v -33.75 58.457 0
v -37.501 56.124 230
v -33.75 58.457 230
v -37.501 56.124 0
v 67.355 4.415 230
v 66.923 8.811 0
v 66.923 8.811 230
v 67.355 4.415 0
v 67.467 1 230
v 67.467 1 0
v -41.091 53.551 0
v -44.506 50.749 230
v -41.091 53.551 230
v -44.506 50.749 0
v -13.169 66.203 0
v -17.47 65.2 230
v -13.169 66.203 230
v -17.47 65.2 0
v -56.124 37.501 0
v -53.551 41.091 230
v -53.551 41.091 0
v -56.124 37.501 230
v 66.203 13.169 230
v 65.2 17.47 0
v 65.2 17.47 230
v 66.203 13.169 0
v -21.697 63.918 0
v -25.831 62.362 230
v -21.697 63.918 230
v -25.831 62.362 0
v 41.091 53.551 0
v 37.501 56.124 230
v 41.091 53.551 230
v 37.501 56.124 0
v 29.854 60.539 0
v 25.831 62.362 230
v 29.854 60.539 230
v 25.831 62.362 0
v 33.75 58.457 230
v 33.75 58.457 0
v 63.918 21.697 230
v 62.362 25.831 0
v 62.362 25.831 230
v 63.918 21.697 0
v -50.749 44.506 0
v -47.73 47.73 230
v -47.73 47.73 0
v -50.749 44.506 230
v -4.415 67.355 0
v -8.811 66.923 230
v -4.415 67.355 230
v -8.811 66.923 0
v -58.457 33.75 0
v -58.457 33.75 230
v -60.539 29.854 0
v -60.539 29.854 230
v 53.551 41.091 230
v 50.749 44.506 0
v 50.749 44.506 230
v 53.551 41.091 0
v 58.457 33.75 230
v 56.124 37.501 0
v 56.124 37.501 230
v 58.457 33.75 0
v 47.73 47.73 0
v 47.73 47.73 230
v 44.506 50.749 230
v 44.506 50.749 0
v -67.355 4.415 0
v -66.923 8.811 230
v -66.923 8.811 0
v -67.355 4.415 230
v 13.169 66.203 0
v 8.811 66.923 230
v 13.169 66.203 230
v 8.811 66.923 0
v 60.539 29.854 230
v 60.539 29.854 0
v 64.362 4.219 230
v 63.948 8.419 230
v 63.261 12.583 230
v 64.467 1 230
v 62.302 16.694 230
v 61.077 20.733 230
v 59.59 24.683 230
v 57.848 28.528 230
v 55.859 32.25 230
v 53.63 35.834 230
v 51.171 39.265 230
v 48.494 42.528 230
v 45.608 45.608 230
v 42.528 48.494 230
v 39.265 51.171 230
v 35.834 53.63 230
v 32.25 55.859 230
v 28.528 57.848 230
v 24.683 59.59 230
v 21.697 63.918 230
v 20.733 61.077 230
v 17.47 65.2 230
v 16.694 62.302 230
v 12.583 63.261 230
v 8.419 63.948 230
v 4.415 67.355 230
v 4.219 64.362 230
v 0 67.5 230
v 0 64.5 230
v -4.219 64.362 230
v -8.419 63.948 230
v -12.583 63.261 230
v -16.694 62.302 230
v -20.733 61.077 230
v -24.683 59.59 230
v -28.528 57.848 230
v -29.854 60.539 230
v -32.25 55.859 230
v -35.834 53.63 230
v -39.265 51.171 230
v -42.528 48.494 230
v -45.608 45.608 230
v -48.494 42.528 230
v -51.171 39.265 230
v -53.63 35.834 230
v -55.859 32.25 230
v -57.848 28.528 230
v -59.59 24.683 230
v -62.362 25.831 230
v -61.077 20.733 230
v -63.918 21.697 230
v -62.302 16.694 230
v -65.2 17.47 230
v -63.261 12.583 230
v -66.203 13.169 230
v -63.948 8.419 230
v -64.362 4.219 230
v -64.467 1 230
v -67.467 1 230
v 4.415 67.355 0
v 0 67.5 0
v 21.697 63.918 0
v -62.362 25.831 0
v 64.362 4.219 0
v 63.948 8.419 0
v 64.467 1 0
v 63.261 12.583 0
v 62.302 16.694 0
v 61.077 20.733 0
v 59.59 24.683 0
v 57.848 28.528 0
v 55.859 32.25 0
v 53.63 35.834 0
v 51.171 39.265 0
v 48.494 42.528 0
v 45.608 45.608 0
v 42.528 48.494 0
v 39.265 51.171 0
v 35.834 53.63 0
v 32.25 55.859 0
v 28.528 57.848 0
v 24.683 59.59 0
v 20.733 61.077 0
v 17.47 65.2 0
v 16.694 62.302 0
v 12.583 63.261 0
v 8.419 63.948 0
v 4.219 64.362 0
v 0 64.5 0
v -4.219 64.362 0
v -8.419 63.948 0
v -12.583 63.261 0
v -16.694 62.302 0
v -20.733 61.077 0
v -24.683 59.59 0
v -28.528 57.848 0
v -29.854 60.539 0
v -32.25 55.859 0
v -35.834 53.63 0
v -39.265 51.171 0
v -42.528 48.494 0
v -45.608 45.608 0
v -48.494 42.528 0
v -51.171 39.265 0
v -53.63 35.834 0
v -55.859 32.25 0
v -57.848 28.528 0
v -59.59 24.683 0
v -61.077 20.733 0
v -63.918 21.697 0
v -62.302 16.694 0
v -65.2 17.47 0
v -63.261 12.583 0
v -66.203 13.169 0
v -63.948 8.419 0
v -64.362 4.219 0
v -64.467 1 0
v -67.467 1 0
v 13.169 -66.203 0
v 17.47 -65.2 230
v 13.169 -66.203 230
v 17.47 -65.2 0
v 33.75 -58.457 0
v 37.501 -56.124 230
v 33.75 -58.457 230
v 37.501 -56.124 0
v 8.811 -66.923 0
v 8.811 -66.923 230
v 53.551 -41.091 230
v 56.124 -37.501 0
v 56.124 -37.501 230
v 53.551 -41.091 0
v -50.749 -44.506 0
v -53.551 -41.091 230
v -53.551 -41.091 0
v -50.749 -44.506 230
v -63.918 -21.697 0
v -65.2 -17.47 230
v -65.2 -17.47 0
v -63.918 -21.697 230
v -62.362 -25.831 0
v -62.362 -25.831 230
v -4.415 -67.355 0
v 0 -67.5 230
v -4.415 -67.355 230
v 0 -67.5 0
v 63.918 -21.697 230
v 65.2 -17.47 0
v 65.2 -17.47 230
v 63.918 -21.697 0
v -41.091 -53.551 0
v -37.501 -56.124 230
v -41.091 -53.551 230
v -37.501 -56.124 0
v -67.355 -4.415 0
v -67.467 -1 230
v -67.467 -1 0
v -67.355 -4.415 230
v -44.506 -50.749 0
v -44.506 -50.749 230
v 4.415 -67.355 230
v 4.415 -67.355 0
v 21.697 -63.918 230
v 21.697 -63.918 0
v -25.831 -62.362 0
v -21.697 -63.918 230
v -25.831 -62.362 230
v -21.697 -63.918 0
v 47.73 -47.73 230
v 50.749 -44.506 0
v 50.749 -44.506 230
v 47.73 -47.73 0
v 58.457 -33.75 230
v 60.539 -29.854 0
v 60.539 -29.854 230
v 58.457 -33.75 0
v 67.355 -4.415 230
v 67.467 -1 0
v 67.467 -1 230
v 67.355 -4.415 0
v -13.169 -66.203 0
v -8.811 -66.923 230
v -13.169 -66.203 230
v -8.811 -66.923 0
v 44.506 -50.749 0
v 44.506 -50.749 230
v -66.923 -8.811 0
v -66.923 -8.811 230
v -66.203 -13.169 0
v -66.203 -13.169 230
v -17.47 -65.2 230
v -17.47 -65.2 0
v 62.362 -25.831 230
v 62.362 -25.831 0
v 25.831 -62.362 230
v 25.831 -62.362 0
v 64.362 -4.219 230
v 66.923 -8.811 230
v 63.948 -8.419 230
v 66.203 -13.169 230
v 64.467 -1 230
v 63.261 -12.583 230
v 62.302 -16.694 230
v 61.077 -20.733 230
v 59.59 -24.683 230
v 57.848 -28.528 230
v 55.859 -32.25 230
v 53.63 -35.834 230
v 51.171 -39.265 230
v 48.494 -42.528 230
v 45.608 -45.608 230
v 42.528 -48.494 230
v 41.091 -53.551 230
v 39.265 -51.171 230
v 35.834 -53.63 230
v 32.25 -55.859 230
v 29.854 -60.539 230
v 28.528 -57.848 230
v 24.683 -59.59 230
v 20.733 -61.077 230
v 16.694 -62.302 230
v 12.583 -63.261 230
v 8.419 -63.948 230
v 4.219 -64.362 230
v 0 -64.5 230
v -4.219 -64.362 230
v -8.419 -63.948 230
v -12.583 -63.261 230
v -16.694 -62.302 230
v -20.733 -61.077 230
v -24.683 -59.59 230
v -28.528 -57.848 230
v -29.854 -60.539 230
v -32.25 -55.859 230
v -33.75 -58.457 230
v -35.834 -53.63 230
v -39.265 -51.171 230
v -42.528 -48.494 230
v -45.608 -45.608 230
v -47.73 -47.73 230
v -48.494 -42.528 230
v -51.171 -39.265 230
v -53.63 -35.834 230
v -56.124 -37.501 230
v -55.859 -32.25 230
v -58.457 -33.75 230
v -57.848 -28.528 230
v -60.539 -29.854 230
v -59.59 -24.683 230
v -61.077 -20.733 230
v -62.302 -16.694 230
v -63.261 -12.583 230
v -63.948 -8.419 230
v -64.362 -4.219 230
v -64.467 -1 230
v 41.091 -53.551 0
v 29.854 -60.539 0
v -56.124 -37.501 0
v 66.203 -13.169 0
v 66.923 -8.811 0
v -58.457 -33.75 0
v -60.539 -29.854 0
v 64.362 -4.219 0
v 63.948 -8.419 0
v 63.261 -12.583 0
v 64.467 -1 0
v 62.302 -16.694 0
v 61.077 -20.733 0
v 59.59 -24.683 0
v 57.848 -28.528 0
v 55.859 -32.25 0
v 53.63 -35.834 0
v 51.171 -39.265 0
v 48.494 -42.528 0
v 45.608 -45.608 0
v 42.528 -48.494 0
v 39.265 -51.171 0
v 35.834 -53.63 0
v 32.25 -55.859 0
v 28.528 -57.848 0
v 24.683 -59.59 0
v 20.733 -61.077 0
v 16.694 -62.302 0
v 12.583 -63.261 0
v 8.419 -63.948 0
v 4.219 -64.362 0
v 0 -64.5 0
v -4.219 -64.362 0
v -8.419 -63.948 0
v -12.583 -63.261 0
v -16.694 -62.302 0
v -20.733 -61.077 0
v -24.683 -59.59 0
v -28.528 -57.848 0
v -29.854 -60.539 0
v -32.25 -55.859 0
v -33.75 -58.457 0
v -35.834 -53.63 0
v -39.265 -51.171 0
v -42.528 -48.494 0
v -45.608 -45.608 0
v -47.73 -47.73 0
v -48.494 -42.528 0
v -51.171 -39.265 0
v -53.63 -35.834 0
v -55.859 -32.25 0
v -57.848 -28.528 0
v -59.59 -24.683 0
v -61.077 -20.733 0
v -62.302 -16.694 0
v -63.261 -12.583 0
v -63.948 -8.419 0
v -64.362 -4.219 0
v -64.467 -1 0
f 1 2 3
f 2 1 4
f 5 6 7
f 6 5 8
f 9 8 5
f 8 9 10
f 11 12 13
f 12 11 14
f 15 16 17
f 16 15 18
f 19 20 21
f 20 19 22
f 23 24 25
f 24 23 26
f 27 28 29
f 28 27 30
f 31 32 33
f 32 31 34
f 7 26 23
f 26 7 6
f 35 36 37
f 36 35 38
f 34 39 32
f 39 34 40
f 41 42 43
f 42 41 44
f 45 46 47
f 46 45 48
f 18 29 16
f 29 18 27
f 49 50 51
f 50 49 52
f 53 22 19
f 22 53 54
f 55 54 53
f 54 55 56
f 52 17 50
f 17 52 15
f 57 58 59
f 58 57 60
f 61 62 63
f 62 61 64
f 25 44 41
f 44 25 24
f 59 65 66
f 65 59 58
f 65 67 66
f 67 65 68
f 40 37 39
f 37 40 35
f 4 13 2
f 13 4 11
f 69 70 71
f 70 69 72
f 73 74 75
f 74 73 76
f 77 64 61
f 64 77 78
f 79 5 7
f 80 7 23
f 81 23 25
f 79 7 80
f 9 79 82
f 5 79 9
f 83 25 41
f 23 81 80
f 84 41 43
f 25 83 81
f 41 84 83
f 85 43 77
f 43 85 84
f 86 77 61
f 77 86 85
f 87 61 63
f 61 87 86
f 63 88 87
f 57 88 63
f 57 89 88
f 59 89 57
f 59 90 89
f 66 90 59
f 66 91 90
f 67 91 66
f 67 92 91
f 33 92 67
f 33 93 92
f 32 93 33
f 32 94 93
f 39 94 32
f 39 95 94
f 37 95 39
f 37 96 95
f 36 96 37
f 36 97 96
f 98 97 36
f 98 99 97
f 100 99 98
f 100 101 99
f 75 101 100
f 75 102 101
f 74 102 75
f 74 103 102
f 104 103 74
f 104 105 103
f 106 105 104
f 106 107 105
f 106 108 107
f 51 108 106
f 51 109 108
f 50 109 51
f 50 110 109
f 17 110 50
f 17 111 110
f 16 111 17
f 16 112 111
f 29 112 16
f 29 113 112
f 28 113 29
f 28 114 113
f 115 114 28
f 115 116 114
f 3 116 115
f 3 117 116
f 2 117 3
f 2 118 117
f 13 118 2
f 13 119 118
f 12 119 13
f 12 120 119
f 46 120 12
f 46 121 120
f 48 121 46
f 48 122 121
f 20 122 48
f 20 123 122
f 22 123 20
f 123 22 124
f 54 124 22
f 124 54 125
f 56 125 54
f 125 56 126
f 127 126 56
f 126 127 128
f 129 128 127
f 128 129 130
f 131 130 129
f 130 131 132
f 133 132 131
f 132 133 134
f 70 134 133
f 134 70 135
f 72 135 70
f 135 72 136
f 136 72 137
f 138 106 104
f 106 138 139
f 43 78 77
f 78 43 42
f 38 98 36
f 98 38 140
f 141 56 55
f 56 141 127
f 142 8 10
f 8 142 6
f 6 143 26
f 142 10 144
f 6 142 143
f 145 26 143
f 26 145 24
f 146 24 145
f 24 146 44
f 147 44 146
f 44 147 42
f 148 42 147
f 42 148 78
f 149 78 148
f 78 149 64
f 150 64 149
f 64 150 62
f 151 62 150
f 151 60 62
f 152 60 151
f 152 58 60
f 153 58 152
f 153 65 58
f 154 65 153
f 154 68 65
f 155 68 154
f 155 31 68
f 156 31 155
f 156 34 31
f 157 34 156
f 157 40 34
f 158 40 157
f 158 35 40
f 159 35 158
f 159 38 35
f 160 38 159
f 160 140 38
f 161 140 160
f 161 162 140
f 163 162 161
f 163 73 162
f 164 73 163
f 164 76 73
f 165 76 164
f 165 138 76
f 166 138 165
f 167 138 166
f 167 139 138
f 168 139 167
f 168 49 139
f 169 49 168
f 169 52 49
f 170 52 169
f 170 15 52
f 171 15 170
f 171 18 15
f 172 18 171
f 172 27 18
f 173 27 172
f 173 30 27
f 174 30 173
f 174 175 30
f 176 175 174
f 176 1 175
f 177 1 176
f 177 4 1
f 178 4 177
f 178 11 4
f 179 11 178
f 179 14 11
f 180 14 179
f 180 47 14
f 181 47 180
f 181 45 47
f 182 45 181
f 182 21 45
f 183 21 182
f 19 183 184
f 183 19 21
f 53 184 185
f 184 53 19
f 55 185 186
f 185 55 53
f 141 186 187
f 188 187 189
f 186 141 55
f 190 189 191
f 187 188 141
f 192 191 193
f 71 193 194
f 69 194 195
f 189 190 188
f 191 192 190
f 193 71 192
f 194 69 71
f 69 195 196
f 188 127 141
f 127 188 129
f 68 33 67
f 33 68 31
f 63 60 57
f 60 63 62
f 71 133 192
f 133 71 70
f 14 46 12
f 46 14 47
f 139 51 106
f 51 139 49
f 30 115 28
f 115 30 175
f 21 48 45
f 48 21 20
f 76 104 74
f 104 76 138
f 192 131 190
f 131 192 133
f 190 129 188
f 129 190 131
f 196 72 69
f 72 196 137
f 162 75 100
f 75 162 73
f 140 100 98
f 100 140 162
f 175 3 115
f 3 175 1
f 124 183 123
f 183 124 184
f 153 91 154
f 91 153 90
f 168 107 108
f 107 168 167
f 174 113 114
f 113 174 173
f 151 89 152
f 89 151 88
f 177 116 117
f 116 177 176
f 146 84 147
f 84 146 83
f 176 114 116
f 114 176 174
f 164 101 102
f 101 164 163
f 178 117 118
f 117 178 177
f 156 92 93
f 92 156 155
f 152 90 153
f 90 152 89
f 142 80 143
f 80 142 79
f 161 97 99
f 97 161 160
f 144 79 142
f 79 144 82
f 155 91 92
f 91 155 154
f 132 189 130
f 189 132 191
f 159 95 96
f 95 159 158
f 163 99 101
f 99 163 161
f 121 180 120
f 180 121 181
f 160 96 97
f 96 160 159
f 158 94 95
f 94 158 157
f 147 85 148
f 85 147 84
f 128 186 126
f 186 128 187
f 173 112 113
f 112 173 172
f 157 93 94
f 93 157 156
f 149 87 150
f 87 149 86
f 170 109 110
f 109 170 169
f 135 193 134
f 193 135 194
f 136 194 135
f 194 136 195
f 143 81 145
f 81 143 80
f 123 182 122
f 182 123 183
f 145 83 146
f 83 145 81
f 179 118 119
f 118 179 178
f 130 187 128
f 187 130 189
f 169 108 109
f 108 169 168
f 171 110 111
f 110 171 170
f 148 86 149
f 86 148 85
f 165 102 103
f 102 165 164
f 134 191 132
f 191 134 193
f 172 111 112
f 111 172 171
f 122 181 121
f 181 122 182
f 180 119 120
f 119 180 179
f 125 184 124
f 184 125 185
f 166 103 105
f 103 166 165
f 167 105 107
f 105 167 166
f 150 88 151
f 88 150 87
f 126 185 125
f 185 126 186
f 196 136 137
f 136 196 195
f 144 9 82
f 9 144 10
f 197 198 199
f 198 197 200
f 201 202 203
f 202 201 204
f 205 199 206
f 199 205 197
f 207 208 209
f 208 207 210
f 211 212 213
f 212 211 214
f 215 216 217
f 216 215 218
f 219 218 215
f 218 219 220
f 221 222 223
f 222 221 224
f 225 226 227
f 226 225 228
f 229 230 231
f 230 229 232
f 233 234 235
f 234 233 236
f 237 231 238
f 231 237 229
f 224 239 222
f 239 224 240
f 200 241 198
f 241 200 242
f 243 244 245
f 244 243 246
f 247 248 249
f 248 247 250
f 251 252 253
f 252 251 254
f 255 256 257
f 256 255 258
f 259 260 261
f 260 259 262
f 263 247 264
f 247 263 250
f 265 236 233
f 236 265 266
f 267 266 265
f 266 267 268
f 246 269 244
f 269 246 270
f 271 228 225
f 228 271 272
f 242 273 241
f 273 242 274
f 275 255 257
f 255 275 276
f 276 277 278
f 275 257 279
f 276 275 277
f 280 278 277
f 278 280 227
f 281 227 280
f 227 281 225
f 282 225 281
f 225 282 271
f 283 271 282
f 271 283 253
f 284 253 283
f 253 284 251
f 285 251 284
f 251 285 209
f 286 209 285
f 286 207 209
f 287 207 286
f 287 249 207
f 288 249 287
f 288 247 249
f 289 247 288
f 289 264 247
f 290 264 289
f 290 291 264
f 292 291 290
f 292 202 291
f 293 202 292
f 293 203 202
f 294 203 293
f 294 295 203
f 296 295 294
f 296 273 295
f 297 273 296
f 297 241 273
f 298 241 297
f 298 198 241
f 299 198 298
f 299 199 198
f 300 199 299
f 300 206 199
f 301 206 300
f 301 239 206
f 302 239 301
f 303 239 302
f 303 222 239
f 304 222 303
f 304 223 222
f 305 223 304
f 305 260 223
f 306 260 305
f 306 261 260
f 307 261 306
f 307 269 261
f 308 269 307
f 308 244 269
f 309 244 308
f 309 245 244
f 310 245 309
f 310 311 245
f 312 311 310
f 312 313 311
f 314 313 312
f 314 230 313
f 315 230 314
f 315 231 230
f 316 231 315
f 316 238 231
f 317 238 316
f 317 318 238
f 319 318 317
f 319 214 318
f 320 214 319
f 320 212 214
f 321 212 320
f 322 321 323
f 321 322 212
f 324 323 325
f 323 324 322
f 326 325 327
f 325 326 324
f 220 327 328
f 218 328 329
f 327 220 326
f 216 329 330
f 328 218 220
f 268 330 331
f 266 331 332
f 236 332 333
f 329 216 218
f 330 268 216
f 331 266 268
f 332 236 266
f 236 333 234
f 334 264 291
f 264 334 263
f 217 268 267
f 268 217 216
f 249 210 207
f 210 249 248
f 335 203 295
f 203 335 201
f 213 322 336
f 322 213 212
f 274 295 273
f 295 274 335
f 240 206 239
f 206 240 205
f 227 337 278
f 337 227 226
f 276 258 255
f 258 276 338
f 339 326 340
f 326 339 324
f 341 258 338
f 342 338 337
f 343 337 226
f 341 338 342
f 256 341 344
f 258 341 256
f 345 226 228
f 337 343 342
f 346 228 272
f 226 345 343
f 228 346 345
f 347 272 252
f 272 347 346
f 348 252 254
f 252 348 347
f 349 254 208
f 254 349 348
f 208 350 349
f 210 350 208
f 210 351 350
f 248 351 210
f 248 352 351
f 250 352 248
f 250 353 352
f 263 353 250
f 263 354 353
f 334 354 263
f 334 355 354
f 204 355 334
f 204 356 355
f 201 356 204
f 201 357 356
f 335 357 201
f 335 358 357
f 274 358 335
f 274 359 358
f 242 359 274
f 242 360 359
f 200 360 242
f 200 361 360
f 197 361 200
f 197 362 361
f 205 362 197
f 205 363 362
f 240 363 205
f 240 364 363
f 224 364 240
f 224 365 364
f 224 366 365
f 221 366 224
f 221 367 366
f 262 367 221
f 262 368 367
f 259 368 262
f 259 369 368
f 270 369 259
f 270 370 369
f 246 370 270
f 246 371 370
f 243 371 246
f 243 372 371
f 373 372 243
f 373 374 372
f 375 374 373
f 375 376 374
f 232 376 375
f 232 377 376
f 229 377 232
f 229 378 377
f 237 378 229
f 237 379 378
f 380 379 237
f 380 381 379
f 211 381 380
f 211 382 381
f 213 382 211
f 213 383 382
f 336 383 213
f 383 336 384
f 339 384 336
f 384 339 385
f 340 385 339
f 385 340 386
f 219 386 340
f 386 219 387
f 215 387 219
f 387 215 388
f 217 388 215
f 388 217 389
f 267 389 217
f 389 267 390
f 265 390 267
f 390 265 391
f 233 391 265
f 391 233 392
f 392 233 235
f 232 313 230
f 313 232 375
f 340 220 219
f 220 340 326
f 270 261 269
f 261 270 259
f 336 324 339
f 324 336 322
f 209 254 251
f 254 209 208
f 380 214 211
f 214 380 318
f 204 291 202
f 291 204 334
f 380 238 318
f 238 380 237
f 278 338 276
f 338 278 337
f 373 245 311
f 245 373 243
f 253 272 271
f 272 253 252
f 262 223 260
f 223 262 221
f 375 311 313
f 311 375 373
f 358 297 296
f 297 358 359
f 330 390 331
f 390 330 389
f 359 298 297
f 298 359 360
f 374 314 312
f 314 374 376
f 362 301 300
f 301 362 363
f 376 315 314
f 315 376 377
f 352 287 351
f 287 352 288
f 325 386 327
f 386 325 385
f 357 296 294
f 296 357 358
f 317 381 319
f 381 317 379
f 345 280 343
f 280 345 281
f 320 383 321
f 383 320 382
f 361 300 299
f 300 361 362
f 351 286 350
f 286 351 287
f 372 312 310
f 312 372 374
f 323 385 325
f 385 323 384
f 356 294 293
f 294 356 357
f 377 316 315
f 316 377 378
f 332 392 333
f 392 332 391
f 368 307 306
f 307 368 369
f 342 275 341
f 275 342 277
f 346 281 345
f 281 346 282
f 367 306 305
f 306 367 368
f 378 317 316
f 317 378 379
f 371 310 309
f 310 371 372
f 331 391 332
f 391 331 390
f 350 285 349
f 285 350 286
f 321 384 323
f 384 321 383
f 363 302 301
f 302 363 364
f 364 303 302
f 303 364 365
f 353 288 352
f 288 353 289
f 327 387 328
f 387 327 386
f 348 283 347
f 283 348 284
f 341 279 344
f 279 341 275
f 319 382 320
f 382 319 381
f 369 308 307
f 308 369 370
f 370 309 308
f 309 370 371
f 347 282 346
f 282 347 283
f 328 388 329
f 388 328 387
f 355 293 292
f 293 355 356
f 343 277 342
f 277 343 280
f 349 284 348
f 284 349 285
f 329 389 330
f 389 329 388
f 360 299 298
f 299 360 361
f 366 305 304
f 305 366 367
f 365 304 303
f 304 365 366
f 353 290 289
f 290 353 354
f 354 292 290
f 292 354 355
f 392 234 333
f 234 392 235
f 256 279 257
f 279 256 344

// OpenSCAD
// file: Parameters.scad
// SYNTHETIC DESIGN EXAMPLE ONLY. Generate project dimensions with suit_clamshell.py.
// limbs_mm rows: upperarm_l/r, forearm_l/r, thigh_l/r, shin_l/r; [diameter, length].
wall_mm = 3;
seam_gap_mm = 2;
hinge_offset_mm = 8;
opening_deg = 110;
limbs_mm = [[148, 270], [148, 270], [135, 230], [135, 230], [221, 380], [221, 380], [164, 365], [164, 365]];
// main file
// Opening limb envelopes only. No authentic armor, real hinge or load approval.
include <Parameters.scad>

part = "forearm";
side = "l";
open_fraction = 0;
piece = "assembly";
$fn = 96;

part_index = part == "upperarm" ? 0 : part == "forearm" ? 1 : part == "thigh" ? 2 : part == "shin" ? 3 : -1;
assert(part_index >= 0, "part must be upperarm, forearm, thigh or shin");
assert(side == "l" || side == "r", "side must be l or r");
assert(piece == "assembly" || piece == "rear" || piece == "front", "piece must be assembly, rear or front");
assert(is_num(open_fraction) && open_fraction >= 0 && open_fraction <= 1, "open_fraction must be 0..1");
assert(is_num(wall_mm) && wall_mm > 0, "positive wall required");
assert(is_num(seam_gap_mm) && seam_gap_mm > 0, "positive seam gap required");
assert(is_num(hinge_offset_mm) && hinge_offset_mm >= 0, "nonnegative hinge offset required");
assert(is_num(opening_deg) && opening_deg > 0 && opening_deg <= 150, "opening angle must be 0..150 degrees");
assert(len(limbs_mm) == 8, "eight independent limb dimension pairs required");
index = 2 * part_index + (side == "l" ? 0 : 1);
diameter = limbs_mm[index][0];
length_mm = limbs_mm[index][1];
assert(is_num(diameter) && diameter > 2 * wall_mm + seam_gap_mm, "invalid diameter");
assert(is_num(length_mm) && length_mm > 0, "positive length required");
radius = diameter / 2;
handedness = side == "l" ? -1 : 1;
hinge_x = handedness * (radius + hinge_offset_mm);
angle = handedness * open_fraction * opening_deg;

// Model axes: Z along limb, negative Y towards front. Half shells remain open at both ends.
module half_shell(front = false) {
    intersection() {
        difference() {
            cylinder(h = length_mm, r = radius);
            translate([0, 0, -1]) cylinder(h = length_mm + 2, r = radius - wall_mm);
        }
        translate([-radius - 1, front ? -radius - 1 : seam_gap_mm / 2, -1])
            cube([diameter + 2, radius + 1 - seam_gap_mm / 2, length_mm + 2]);
    }
}

if (piece == "assembly" || piece == "rear") color([0.19, 0.28, 0.20]) half_shell();
if (piece == "assembly" || piece == "front")
    translate([hinge_x, 0, 0]) rotate([0, 0, angle]) translate([-hinge_x, 0, 0])
        color([0.45, 0.56, 0.28]) half_shell(true);

// Preview-only virtual pivot: excluded from render/STL, not a printed axle.
if ($preview && piece == "assembly")
    %translate([hinge_x, 0, -5]) cylinder(h = length_mm + 10, r = 1.5);
